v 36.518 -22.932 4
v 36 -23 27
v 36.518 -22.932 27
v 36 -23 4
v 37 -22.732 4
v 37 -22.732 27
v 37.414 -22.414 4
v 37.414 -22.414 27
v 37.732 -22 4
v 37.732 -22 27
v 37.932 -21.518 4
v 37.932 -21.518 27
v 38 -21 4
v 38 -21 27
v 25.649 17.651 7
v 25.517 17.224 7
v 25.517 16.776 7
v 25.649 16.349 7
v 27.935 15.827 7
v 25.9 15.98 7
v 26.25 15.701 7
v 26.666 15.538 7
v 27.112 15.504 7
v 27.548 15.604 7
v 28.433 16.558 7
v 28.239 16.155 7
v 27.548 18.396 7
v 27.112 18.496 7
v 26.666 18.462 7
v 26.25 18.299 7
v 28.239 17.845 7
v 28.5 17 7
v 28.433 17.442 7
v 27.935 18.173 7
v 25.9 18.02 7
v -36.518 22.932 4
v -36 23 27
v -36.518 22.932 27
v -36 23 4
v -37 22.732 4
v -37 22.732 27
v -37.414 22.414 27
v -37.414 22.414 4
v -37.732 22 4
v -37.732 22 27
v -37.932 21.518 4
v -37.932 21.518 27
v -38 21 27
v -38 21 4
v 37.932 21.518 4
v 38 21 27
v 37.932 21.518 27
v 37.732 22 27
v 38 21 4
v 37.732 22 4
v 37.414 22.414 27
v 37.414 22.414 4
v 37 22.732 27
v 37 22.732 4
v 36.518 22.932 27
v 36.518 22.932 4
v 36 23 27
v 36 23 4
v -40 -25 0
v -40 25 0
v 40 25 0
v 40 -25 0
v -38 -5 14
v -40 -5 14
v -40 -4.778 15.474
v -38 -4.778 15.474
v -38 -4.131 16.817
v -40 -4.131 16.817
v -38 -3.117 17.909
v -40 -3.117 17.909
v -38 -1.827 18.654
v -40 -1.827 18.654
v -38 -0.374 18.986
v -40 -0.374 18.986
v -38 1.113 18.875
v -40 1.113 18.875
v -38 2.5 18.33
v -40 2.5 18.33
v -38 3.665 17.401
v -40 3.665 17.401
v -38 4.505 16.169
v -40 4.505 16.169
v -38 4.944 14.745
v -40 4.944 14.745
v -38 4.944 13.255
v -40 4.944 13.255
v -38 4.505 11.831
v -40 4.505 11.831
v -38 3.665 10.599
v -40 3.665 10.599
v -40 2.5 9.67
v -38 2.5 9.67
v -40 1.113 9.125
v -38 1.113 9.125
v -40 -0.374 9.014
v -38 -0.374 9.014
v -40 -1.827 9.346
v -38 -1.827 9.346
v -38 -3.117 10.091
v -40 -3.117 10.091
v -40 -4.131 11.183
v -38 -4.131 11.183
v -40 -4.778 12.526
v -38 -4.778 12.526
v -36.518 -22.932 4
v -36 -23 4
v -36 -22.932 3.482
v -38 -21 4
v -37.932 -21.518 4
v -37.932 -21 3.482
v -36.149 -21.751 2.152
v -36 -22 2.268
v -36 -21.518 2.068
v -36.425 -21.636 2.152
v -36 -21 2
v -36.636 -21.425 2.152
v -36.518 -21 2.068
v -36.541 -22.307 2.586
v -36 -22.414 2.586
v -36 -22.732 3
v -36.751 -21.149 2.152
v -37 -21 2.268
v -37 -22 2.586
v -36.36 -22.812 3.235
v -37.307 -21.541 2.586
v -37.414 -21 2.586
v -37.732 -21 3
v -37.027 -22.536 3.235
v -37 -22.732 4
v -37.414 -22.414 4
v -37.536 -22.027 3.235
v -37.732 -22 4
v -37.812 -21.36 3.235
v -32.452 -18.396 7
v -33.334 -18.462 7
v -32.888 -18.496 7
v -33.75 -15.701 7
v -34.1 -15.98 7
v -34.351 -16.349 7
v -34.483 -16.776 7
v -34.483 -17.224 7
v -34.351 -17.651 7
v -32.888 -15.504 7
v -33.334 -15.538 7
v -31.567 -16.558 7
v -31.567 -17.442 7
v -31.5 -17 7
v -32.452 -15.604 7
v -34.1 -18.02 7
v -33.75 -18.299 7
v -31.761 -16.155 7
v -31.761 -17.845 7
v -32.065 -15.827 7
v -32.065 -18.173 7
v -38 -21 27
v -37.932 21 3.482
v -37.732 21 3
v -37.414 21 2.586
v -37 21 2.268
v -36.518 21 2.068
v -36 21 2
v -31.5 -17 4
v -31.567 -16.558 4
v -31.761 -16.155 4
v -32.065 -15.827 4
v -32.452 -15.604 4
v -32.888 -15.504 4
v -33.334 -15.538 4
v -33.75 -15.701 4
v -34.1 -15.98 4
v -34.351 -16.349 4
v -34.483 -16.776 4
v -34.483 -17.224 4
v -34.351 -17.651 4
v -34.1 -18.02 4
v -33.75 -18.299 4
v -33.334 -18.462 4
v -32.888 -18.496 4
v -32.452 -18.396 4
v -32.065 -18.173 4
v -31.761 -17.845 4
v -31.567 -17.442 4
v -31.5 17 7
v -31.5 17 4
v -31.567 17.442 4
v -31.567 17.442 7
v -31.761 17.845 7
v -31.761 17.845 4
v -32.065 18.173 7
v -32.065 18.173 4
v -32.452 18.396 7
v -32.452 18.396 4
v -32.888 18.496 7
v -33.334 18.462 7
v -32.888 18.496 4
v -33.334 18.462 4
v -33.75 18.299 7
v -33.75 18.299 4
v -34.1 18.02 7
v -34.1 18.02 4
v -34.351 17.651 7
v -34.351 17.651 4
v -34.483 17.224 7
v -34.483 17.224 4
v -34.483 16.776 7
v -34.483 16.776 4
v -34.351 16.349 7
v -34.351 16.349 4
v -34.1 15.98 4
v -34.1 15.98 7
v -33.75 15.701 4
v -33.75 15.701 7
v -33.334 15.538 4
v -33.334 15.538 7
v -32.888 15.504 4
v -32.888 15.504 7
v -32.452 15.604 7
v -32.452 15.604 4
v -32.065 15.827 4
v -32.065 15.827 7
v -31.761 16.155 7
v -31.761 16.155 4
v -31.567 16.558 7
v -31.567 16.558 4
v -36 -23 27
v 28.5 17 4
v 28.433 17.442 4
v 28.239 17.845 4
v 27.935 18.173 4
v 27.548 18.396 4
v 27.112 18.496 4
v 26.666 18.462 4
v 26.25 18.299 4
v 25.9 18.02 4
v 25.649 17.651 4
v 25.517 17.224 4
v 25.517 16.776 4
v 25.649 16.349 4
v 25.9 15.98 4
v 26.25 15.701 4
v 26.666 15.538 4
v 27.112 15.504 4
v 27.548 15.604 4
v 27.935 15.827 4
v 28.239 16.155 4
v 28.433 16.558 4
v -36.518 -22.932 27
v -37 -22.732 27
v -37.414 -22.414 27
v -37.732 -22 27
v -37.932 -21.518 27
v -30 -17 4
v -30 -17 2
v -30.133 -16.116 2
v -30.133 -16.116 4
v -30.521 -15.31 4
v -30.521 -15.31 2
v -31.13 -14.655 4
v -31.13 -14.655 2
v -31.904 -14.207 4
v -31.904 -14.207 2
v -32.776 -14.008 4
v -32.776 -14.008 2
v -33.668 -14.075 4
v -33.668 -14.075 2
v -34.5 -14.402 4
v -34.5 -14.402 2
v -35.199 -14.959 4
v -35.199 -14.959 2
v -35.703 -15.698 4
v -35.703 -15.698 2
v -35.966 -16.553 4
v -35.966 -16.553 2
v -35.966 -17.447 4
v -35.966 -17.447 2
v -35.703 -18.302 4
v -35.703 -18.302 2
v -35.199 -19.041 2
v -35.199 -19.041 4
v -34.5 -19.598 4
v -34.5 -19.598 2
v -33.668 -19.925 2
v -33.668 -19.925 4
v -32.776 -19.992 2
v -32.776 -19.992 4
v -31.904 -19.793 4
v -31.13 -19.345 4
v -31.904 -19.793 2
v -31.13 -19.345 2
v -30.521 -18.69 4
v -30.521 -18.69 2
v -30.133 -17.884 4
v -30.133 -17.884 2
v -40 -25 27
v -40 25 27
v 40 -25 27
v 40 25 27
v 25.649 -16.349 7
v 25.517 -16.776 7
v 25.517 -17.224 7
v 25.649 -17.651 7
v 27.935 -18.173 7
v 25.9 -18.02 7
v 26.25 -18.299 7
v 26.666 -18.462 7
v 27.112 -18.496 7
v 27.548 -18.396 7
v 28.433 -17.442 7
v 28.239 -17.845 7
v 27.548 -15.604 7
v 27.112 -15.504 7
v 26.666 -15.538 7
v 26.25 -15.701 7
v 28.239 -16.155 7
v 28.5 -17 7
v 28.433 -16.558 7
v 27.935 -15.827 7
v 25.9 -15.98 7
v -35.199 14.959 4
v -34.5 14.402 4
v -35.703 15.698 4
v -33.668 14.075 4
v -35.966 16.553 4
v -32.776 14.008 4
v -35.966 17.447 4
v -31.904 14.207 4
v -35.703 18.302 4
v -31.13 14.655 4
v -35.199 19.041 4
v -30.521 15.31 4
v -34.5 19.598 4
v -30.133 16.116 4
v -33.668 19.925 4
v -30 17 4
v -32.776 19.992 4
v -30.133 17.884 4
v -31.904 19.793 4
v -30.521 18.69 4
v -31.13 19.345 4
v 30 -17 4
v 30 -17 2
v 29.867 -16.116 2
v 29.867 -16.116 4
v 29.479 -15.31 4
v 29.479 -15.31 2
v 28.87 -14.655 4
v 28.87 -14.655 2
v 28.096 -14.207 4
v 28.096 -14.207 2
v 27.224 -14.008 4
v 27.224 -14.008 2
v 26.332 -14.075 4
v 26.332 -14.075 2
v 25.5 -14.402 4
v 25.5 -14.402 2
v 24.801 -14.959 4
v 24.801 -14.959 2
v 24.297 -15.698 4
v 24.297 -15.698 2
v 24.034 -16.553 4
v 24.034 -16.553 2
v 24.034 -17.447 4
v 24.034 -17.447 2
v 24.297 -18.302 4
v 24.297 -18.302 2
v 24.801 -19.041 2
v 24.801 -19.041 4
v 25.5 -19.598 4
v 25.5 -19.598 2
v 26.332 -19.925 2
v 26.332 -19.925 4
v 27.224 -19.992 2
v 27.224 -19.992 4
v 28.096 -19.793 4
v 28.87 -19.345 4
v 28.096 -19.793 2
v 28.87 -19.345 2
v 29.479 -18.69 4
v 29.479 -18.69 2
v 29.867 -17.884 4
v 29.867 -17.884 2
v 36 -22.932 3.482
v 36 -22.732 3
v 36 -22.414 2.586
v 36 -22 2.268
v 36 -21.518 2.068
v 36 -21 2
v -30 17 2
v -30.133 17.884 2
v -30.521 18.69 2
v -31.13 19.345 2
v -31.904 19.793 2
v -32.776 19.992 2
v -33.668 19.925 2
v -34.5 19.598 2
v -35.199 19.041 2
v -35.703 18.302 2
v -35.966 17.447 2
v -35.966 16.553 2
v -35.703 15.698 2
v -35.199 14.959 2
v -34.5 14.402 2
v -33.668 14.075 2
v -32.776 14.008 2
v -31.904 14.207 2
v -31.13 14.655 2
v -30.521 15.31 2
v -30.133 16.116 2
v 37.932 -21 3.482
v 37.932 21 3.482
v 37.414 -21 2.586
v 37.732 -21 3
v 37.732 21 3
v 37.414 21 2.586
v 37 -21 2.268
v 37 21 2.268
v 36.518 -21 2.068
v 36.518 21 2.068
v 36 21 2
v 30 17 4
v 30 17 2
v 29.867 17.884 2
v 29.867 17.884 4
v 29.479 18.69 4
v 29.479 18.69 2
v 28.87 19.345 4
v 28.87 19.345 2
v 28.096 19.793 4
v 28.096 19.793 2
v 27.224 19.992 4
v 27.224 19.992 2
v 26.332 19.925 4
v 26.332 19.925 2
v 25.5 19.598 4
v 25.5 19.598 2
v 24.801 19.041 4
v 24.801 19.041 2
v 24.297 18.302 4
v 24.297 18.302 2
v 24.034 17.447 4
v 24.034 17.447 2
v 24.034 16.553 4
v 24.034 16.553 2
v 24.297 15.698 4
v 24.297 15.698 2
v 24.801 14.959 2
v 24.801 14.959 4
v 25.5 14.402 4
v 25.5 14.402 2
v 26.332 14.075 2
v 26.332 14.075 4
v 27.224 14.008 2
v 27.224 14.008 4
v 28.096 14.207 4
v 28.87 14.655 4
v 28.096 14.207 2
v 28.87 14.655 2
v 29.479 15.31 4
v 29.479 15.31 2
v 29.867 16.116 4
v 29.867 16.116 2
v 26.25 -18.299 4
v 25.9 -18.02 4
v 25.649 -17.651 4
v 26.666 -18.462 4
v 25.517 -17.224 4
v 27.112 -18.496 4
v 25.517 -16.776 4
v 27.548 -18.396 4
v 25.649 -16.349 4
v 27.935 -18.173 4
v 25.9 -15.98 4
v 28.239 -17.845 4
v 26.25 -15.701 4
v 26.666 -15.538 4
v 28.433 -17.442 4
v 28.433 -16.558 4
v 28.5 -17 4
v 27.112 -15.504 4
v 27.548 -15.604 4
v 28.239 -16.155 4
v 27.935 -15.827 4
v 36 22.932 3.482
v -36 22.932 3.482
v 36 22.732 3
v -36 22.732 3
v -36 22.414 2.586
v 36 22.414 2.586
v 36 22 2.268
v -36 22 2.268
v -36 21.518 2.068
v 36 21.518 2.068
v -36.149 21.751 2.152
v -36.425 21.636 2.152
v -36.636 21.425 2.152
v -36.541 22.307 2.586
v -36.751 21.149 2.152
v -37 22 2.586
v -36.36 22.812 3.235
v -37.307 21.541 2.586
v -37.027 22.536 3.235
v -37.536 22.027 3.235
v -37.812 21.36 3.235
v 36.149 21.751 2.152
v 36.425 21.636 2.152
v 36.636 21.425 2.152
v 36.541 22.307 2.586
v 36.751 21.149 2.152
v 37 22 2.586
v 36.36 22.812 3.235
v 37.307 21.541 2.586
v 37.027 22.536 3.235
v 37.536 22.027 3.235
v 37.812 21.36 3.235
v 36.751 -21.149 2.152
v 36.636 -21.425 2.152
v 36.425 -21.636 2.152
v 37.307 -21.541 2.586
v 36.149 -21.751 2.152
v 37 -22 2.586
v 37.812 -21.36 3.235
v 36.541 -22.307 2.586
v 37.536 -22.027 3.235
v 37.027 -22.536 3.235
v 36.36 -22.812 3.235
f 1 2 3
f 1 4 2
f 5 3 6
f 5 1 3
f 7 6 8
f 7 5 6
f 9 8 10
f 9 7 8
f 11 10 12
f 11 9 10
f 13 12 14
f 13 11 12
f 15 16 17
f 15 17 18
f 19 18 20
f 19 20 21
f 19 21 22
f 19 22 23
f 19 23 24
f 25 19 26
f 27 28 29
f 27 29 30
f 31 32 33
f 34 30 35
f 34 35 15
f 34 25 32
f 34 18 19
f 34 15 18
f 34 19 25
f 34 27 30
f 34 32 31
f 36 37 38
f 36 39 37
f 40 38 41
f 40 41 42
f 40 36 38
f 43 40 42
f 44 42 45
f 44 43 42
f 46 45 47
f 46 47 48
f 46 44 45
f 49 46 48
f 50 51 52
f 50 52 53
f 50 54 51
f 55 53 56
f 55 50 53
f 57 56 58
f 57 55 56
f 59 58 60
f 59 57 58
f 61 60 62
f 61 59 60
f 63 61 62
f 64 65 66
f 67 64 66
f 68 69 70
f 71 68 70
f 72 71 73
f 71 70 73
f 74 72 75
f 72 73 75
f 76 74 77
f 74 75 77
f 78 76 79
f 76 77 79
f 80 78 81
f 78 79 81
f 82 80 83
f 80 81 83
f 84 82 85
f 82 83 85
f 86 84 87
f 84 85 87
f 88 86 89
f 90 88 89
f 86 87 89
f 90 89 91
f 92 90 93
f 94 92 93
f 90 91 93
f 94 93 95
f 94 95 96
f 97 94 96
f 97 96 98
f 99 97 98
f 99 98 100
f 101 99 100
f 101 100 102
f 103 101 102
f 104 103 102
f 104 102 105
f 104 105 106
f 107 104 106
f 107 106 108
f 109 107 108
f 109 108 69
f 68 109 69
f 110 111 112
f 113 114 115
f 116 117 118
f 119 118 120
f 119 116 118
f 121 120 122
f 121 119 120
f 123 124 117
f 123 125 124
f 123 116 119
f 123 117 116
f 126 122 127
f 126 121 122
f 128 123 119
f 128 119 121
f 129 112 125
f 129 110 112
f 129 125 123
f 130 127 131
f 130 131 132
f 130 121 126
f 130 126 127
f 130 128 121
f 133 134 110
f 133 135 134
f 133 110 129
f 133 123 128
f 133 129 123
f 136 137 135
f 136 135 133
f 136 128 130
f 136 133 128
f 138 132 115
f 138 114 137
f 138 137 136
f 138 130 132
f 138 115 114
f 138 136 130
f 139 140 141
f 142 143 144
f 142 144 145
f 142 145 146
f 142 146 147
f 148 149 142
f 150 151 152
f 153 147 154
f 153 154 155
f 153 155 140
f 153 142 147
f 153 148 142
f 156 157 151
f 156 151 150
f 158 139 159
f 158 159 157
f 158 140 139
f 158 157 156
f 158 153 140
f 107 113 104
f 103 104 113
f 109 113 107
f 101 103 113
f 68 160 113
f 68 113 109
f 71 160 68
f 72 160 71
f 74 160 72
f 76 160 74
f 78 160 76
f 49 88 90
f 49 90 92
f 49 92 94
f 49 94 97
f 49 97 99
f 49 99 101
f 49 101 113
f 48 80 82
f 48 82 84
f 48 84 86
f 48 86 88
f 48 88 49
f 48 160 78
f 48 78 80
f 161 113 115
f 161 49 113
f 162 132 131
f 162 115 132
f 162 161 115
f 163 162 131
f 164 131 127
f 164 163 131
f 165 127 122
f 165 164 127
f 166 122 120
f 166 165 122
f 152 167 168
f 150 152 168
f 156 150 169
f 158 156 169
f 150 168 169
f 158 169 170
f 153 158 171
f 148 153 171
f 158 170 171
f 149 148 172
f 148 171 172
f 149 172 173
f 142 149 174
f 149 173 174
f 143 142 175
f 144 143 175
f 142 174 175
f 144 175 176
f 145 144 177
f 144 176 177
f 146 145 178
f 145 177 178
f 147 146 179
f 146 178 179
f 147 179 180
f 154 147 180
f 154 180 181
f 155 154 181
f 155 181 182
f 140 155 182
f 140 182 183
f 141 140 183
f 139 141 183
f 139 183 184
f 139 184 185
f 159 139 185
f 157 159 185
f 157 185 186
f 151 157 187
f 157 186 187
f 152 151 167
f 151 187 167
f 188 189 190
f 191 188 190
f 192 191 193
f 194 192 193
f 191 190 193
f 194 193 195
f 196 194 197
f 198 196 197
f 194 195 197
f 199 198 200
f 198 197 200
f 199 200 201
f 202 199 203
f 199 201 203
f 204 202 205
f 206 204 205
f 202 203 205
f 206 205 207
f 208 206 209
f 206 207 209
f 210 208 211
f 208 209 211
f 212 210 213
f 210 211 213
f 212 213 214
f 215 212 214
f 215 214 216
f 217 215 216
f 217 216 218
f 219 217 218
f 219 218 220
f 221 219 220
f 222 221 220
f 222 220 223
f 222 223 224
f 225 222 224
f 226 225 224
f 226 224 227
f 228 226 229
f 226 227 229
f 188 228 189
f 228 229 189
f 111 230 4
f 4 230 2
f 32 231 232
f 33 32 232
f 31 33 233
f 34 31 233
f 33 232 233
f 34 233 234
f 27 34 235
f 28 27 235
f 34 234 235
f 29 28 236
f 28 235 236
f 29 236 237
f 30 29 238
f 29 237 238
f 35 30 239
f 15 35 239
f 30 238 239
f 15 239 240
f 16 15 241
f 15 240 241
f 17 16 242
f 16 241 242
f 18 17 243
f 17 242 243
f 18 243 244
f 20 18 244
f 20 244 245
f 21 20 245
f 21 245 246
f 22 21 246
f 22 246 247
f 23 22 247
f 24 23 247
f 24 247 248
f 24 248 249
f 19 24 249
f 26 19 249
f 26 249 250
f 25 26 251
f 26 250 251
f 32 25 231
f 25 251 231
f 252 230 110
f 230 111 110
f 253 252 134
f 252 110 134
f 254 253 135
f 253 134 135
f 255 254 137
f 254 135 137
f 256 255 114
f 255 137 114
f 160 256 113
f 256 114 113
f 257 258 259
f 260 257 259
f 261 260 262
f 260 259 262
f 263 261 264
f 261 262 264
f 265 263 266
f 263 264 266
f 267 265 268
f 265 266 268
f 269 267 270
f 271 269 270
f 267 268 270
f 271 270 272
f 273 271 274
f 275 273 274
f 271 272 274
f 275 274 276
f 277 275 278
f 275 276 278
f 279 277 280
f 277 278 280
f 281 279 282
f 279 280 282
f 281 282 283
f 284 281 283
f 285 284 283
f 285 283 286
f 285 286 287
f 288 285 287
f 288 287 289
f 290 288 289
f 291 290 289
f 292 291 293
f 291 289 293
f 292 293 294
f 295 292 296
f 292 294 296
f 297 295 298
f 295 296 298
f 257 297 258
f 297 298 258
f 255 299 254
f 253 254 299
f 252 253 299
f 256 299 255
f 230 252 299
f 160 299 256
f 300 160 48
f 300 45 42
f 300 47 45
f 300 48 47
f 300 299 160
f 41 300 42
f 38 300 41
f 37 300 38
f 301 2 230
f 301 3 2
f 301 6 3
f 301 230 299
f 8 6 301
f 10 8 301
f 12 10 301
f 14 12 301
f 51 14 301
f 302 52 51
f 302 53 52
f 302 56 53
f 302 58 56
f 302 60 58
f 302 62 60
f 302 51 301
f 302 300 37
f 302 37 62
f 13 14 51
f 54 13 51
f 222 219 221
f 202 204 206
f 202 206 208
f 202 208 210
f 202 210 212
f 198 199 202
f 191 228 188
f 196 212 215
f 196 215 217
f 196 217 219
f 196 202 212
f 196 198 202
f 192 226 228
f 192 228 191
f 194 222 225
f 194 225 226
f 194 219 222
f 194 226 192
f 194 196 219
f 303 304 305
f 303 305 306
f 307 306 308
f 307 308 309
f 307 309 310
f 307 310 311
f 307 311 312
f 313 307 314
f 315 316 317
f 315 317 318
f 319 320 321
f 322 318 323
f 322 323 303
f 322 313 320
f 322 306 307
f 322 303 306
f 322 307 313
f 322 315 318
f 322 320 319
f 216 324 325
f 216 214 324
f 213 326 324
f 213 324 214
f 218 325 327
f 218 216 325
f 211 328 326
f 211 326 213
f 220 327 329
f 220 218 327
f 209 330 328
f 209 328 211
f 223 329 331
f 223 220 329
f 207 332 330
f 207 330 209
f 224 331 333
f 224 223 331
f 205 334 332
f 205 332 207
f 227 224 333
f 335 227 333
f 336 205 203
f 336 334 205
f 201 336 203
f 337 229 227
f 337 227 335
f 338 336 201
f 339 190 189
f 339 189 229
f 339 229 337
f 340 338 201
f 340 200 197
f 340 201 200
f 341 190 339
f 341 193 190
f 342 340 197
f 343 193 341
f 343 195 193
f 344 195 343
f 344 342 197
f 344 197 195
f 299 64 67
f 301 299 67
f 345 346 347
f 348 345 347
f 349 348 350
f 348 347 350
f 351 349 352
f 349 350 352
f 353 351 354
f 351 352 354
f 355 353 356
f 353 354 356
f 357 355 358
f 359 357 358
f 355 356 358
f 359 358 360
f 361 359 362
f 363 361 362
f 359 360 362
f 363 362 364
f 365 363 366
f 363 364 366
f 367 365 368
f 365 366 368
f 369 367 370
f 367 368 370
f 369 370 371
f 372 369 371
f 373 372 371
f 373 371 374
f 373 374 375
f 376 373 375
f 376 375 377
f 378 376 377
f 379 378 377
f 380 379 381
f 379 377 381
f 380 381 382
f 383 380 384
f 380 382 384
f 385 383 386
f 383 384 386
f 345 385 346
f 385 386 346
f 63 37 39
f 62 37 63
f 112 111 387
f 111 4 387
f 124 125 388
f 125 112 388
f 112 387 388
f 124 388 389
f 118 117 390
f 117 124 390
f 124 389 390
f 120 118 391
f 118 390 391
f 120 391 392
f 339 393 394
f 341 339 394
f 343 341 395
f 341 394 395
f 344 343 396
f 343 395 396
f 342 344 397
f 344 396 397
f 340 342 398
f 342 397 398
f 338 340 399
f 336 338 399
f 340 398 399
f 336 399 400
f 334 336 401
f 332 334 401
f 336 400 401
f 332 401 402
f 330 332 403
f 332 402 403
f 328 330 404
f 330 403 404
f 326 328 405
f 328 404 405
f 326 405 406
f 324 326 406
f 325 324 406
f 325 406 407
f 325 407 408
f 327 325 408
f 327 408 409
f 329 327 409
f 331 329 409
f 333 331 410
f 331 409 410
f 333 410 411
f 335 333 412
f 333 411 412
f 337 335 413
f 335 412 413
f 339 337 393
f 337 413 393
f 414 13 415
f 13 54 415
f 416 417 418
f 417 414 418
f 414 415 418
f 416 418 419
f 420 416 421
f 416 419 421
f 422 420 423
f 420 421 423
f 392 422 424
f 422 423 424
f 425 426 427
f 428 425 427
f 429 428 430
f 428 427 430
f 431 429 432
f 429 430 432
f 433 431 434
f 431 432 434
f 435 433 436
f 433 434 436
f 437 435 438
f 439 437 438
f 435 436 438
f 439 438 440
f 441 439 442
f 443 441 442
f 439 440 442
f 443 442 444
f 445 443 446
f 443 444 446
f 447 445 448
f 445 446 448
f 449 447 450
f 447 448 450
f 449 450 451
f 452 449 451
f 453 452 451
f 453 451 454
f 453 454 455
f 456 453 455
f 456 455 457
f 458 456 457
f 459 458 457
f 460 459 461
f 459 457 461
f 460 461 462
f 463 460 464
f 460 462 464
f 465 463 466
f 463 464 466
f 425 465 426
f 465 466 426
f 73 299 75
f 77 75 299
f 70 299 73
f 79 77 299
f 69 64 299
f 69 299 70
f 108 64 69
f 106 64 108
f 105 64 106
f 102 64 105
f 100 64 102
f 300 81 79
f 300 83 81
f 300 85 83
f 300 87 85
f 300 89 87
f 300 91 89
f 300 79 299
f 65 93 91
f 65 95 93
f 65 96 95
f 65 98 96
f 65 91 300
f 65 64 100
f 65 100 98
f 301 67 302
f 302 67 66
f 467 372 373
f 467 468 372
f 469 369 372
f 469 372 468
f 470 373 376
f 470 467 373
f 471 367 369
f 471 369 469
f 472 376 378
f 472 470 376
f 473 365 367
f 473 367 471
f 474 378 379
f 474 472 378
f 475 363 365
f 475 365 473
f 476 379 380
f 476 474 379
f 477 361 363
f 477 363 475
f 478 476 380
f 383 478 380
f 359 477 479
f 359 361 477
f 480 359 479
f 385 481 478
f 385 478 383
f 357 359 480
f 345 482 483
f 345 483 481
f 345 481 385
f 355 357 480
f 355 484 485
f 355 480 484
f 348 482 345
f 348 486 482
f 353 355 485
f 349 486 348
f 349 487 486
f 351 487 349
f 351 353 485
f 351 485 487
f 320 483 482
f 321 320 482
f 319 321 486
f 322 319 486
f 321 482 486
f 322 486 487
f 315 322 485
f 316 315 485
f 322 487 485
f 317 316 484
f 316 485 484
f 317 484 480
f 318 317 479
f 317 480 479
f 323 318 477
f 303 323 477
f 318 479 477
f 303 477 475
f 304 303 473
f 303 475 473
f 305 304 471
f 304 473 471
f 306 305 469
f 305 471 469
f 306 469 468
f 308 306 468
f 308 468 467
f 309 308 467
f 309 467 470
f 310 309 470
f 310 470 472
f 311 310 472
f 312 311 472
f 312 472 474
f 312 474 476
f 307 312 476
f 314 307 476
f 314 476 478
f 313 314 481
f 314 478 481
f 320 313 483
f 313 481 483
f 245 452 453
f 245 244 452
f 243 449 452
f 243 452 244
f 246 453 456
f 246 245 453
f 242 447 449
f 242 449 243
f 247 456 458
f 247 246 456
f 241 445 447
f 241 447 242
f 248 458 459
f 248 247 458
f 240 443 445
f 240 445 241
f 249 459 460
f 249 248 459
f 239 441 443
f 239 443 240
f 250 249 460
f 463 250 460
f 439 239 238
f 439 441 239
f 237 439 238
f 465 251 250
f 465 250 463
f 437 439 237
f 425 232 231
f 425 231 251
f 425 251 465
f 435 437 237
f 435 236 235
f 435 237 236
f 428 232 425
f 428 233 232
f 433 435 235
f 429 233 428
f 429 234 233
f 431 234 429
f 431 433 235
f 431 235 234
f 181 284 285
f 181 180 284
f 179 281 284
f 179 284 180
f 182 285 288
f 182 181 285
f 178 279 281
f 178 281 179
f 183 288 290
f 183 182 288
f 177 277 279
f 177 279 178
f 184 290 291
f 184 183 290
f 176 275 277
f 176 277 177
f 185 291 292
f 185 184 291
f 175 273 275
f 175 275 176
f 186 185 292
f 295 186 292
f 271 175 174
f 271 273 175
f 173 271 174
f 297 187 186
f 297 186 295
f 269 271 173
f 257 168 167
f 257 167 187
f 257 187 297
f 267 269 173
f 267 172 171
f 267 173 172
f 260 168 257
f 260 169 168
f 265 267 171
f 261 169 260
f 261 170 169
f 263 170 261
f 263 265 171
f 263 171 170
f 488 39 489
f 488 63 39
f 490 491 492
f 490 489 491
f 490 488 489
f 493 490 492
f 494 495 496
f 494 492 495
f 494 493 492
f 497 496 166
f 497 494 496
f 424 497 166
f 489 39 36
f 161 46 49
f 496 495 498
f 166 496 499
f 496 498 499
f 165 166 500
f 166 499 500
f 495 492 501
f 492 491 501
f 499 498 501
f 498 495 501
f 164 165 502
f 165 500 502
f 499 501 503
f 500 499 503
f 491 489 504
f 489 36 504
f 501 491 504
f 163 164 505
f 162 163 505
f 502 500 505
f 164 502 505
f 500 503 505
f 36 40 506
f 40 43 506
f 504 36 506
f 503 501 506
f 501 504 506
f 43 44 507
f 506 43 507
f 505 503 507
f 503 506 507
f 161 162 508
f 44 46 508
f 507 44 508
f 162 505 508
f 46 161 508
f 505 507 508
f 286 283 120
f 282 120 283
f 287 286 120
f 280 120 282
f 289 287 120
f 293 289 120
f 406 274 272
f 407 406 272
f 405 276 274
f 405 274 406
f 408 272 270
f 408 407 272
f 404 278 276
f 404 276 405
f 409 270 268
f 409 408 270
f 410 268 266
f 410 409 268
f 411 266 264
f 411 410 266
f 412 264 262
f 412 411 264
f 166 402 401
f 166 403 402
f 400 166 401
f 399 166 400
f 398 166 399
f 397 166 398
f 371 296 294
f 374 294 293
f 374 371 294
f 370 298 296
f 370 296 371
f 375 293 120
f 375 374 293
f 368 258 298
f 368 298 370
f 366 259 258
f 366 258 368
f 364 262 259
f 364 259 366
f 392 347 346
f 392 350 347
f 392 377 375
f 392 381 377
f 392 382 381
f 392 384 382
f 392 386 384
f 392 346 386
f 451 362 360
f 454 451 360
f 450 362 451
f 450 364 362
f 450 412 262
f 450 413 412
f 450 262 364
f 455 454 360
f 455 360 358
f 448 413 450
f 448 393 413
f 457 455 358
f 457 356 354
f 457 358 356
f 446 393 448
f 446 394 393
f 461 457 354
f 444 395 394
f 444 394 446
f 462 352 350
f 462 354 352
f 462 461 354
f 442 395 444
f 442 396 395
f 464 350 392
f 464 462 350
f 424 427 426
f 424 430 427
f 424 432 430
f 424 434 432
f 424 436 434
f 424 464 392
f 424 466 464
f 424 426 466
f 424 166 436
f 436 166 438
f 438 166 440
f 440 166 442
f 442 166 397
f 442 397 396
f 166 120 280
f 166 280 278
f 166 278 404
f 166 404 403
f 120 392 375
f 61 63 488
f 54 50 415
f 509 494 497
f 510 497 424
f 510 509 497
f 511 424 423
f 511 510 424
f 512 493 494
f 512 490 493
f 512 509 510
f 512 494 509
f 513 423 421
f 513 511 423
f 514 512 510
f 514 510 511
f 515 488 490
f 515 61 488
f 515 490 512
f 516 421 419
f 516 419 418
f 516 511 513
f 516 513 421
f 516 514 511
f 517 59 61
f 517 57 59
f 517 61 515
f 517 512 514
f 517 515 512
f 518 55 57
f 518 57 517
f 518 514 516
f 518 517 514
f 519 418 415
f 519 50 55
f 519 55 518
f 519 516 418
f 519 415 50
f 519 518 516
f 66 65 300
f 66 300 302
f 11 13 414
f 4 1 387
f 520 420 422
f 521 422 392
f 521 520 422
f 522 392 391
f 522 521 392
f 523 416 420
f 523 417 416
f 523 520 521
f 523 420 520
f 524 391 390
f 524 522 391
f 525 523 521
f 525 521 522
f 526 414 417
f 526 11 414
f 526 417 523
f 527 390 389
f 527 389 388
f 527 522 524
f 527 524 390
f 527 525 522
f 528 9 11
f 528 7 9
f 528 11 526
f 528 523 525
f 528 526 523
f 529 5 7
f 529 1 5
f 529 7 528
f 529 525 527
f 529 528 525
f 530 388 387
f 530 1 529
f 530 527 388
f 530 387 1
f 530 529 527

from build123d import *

# Parameters (mm, degrees)
F0_W     = 80
F0_H     = 50
F1_DEPTH = 27
F2_W     = 76
F2_H     = 46
F3_DEPTH = 25
F4_R     = 3
F5_DEPTH = 2
F6_R     = 1.5
F7_DEPTH = 3
F8_R     = 5
F9_DEPTH = 25
F10_R    = 1.99999


# Not quite as in the source:
# - a fillet or chamfer is up to 0.001 mm smaller than in the source, because OpenCascade refuses the exact size


with BuildPart() as f1:
    # F0 (on Top) → F1 (new body)
    with BuildSketch(Plane.XY):
        Rectangle(F0_W, F0_H)
    extrude(amount=F1_DEPTH)

    # F2 (on face) → F3 (cut)
    with BuildSketch(Plane.XY.offset(27)):
        Rectangle(F2_W, F2_H)
    extrude(amount=-F3_DEPTH, mode=Mode.SUBTRACT)

    # F4 (on face) → F5 (join)
    with BuildSketch(Plane.XY.offset(2)):
        with Locations((-33, 17)):
            Circle(F4_R)
        with Locations((27, 17)):
            Circle(F4_R)
        with Locations((27, -17)):
            Circle(F4_R)
        with Locations((-33, -17)):
            Circle(F4_R)
    extrude(amount=F5_DEPTH)

    # F6 (on face) → F7 (join)
    with BuildSketch(Plane.XY.offset(4)):
        with Locations((-33, 17)):
            Circle(F6_R)
        with Locations((27, 17)):
            Circle(F6_R)
        with Locations((27, -17)):
            Circle(F6_R)
        with Locations((-33, -17)):
            Circle(F6_R)
    extrude(amount=F7_DEPTH)

    # F8 (on face) → F9 (cut)
    with BuildSketch(Plane(origin=(-40, 0, 0), x_dir=(0, -1, 0), z_dir=(-1, 0, 0))):
        with Locations((0, 14)):
            Circle(F8_R)
    extrude(amount=-F9_DEPTH, mode=Mode.SUBTRACT)

    # F10 (radius 2 in the source; OpenCascade refuses exactly that, so slightly less here)
    f10_edges = [f1.edges().sort_by_distance(p)[0] for p in [
        (-38, 23, 14.5),
        (38, 23, 14.5),
        (38, -23, 14.5),
        (-38, -23, 14.5),
        (0, 23, 2),
        (38, 0, 2),
        (0, -23, 2),
        (-38, 0, 2),
    ]]
    fillet(f10_edges, radius=F10_R)


solid = f1.part
